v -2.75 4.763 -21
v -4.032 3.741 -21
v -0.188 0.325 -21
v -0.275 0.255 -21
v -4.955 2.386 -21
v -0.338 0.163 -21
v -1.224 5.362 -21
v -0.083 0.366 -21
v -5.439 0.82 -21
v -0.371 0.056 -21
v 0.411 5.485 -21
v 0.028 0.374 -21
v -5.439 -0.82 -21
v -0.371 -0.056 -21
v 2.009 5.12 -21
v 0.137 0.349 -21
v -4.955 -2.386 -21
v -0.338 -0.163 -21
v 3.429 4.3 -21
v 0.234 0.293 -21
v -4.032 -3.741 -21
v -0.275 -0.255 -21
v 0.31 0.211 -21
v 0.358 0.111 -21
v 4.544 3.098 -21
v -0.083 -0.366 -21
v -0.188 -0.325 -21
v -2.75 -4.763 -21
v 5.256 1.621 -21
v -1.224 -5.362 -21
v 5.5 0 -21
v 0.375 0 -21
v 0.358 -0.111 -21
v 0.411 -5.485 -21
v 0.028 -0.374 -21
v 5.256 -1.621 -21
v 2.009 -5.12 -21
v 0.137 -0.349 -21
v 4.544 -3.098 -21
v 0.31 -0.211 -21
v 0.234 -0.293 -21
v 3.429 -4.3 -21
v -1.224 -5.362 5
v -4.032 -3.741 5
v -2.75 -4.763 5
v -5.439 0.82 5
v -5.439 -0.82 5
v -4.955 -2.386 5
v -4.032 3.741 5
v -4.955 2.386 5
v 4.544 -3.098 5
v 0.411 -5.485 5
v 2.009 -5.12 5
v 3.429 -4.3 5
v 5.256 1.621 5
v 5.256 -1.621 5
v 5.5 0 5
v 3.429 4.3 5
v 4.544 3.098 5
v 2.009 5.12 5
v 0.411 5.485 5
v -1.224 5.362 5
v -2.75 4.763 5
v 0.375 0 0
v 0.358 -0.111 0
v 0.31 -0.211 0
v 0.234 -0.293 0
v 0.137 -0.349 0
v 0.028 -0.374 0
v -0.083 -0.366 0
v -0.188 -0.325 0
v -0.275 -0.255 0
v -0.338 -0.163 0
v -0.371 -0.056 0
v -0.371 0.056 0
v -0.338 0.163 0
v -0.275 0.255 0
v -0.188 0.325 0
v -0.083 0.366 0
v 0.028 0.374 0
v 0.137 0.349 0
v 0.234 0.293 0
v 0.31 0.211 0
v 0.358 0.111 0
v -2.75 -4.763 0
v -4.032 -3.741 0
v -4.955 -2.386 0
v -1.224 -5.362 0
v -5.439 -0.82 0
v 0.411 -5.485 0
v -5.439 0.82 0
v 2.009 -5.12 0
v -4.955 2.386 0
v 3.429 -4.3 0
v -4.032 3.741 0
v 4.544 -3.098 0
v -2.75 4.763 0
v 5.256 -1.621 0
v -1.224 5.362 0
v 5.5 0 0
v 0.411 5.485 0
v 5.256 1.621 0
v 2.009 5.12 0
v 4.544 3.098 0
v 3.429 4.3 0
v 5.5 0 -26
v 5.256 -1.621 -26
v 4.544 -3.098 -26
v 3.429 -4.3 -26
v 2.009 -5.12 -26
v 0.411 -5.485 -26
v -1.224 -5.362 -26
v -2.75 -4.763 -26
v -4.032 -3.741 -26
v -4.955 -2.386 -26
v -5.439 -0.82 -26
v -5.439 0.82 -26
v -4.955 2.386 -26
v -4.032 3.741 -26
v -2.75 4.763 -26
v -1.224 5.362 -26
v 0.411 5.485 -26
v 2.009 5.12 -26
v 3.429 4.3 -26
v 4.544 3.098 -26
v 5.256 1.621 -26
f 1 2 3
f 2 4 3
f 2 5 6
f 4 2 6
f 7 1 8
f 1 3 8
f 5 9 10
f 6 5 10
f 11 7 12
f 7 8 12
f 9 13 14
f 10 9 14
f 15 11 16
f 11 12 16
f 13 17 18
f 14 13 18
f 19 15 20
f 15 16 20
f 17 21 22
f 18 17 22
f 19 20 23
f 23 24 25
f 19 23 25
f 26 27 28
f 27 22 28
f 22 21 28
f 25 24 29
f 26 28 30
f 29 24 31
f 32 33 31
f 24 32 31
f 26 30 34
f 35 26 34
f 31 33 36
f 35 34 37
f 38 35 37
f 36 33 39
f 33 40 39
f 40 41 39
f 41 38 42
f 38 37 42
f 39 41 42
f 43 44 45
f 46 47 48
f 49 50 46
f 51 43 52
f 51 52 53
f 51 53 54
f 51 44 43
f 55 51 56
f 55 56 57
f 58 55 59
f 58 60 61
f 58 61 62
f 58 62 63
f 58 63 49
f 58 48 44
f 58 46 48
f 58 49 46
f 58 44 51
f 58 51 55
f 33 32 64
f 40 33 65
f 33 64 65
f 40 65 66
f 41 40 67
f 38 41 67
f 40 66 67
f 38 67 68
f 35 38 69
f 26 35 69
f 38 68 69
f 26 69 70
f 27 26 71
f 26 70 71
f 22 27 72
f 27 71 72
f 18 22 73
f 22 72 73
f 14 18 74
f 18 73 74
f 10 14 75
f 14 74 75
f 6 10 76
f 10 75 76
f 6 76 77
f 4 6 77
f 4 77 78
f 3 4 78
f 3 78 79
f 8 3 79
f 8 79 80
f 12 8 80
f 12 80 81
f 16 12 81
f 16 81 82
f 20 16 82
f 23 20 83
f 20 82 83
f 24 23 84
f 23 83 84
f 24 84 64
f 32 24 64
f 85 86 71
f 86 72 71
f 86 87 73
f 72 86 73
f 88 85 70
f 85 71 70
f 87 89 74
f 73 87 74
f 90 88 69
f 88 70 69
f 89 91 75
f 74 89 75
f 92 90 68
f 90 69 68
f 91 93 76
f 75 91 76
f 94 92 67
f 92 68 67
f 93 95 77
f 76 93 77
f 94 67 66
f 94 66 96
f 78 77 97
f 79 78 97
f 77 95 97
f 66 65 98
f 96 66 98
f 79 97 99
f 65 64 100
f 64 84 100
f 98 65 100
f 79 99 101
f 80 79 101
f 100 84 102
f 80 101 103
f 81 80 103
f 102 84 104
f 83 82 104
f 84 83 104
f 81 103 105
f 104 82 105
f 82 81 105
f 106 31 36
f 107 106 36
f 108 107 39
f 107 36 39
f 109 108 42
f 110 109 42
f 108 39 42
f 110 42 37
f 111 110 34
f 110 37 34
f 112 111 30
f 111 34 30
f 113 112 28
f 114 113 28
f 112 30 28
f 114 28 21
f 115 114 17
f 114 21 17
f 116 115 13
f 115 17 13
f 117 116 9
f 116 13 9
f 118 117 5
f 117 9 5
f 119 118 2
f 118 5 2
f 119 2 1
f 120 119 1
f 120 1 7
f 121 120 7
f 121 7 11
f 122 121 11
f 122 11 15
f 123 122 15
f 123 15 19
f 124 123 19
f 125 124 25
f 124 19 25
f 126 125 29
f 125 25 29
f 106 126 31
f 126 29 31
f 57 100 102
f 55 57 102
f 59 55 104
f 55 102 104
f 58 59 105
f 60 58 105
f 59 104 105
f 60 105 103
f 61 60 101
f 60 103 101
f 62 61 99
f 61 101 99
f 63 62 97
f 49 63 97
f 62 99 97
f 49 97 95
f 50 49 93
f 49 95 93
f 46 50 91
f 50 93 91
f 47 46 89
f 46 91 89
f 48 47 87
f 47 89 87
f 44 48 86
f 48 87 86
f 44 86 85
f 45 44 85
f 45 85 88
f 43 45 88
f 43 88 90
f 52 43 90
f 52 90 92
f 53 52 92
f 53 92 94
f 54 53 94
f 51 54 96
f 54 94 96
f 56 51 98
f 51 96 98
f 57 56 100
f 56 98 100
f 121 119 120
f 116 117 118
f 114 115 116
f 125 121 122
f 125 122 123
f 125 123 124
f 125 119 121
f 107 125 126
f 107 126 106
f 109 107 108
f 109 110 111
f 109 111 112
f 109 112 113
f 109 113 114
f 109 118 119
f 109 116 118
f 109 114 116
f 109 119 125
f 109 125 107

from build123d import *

# Parameters (mm, degrees)
F0_R     = 5.5
F1_DEPTH = 5
F3_R     = 5.5
F4_DEPTH = 5
F5_R     = 0.375
F6_DEPTH = 21


with BuildPart() as f1:
    # F0 (on Top) → F1 (new body)
    with BuildSketch(Plane.XY):
        Circle(F0_R)
    extrude(amount=F1_DEPTH)



with BuildPart() as f4:
    # F3 (on offset) → F4 (new body)
    with BuildSketch(Plane(origin=(0, 0, -21), x_dir=(1, 0, 0), z_dir=(0, 0, -1))):
        Circle(F3_R)
    extrude(amount=F4_DEPTH)


with BuildPart() as f1_1:
    add(f1.part)

    add(f4.part)  # F6 merges F4
    # F5 (on face) → F6 (join)
    with BuildSketch(Plane(origin=(0, 0, 0), x_dir=(1, 0, 0), z_dir=(0, 0, -1))):
        Circle(F5_R)
    extrude(amount=F6_DEPTH)


solid = f1_1.part
